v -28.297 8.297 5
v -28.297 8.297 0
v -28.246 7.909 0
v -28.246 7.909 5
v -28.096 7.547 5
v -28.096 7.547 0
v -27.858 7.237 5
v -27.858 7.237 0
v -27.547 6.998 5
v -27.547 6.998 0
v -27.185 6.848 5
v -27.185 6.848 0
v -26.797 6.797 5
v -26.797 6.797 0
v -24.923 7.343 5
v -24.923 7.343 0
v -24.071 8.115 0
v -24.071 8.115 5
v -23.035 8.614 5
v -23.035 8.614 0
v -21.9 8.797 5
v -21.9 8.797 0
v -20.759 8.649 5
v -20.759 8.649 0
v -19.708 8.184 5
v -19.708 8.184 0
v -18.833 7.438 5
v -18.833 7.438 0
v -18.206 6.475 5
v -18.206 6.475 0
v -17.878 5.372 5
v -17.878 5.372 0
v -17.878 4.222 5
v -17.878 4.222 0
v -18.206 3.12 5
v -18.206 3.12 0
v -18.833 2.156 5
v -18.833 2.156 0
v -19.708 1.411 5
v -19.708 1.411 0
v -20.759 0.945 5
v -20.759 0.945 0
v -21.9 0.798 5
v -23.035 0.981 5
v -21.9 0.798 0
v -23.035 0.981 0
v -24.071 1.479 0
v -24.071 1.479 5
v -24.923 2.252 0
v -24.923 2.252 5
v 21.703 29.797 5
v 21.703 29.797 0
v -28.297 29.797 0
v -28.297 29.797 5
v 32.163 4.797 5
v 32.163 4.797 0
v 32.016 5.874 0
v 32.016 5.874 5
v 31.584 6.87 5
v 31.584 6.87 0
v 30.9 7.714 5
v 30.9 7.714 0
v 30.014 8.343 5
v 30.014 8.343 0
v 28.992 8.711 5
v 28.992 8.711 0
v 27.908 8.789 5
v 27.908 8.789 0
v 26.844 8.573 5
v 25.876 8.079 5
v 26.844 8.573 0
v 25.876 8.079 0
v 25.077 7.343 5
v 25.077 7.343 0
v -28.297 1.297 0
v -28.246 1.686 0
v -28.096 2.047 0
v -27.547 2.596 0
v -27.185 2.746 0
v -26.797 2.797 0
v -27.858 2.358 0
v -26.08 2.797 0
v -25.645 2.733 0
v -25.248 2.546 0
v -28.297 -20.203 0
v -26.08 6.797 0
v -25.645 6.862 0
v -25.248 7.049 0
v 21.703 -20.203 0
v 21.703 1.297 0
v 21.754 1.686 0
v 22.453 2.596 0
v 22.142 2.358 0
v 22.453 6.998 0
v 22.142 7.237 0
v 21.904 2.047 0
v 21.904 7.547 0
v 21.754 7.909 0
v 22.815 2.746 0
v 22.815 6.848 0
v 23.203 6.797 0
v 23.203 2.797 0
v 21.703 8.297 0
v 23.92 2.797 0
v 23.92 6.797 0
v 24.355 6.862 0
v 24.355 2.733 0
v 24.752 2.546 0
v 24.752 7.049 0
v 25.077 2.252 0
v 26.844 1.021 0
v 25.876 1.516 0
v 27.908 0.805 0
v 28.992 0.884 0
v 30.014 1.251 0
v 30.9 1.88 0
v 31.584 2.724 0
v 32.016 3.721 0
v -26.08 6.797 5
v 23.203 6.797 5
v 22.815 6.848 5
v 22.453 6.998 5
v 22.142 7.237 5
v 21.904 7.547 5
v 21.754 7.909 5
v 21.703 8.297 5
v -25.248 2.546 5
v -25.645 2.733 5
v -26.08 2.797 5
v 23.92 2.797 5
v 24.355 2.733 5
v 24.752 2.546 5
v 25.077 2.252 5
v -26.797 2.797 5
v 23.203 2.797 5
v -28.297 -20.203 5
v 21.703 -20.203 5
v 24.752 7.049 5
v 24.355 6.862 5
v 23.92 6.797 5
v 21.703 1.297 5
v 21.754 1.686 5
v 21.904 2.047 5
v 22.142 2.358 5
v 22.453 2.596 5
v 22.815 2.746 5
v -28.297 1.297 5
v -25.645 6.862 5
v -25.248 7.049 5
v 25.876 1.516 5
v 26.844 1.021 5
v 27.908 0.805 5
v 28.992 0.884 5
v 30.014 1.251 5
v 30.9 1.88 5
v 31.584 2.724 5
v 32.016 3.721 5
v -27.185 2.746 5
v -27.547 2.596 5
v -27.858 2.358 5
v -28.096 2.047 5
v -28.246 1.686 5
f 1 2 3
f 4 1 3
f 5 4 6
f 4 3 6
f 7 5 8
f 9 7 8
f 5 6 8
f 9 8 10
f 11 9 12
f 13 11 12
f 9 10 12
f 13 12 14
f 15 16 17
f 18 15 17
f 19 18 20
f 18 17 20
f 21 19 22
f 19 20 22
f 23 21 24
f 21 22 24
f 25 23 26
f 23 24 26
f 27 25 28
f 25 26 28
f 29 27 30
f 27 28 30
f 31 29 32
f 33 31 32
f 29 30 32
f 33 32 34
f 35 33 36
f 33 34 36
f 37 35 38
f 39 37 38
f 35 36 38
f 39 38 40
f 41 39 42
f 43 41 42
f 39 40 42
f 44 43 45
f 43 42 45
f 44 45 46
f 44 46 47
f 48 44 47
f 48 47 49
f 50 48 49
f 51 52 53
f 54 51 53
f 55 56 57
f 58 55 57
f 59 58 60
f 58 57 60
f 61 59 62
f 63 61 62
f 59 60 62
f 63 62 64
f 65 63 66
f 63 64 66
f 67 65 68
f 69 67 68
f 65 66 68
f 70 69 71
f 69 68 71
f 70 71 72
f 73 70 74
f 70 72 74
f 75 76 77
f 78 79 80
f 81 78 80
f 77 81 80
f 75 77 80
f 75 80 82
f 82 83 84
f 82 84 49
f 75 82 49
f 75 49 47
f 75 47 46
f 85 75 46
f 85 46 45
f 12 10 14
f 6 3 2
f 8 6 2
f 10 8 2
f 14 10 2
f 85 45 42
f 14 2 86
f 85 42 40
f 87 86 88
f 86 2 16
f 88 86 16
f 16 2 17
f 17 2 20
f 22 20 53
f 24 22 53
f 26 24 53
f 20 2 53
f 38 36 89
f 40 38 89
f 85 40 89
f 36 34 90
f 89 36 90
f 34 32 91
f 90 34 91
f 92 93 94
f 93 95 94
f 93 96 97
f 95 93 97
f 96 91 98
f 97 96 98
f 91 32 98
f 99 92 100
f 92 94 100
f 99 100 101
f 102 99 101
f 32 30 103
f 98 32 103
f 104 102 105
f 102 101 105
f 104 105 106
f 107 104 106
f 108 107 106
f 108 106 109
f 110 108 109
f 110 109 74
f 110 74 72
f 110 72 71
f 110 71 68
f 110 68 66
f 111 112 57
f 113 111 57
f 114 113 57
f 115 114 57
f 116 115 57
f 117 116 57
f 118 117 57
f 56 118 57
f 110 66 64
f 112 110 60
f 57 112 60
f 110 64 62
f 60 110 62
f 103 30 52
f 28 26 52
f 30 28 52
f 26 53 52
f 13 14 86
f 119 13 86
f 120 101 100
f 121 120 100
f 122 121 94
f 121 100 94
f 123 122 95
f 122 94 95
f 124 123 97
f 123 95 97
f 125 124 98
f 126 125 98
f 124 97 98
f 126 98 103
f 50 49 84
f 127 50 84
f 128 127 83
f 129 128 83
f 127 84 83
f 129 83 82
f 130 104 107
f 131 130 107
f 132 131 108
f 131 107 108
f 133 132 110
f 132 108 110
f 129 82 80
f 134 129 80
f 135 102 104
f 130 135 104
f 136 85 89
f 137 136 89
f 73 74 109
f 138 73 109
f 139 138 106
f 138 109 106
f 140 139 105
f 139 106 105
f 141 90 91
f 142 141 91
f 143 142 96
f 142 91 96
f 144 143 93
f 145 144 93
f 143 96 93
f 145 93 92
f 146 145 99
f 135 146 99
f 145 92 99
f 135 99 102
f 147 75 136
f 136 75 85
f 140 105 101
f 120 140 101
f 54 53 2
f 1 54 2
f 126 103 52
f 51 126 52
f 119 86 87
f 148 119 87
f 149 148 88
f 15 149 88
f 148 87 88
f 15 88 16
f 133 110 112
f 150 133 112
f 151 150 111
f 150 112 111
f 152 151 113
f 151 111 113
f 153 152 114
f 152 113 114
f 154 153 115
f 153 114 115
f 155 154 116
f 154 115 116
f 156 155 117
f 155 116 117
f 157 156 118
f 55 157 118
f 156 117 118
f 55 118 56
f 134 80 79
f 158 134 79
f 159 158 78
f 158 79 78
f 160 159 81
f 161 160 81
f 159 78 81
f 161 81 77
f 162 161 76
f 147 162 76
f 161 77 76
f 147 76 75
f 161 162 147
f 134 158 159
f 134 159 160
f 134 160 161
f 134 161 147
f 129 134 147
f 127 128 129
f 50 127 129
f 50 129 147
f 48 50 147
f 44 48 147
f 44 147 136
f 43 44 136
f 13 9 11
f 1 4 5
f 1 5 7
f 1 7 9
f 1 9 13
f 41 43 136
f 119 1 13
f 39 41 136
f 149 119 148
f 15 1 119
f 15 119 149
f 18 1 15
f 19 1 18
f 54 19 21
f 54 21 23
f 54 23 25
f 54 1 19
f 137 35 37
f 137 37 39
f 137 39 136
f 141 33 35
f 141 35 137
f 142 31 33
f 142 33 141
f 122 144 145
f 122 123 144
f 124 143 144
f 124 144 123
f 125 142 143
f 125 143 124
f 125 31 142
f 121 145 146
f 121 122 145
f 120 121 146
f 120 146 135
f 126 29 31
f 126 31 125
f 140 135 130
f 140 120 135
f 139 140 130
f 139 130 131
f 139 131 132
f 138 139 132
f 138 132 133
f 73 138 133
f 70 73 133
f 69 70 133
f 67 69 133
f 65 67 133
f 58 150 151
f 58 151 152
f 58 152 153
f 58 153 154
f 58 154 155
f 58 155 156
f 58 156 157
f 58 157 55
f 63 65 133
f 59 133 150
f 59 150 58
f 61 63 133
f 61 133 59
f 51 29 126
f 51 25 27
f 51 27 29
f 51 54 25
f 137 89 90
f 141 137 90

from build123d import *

# Parameters (mm, degrees)
F1_DEPTH = 5


with BuildPart() as f1:
    # F0 (on Top) → F1 (new body)
    with BuildSketch(Plane.XY):
        with BuildLine():
            Line((21.70305, 29.797339), (-28.29695, 29.797339))
            Line((-28.29695, 29.797339), (-28.29695, 8.297339))
            ThreePointArc((-28.29695, 8.297339), (-27.85761, 7.236679), (-26.79695, 6.797339))
            Line((-26.79695, 6.797339), (-26.079591, 6.797339))
            ThreePointArc((-26.079591, 6.797339), (-25.439988, 6.940538), (-24.922507, 7.342794))
            ThreePointArc((-24.922507, 7.342794), (-17.83695, 4.797339), (-24.922507, 2.251885))
            ThreePointArc((-24.922507, 2.251885), (-25.439988, 2.65414), (-26.079591, 2.797339))
            Line((-26.079591, 2.797339), (-26.79695, 2.797339))
            ThreePointArc((-26.79695, 2.797339), (-27.85761, 2.358), (-28.29695, 1.297339))
            Line((-28.29695, 1.297339), (-28.29695, -20.202661))
            Line((-28.29695, -20.202661), (21.70305, -20.202661))
            Line((21.70305, -20.202661), (21.70305, 1.297339))
            ThreePointArc((21.70305, 1.297339), (22.14239, 2.358), (23.20305, 2.797339))
            Line((23.20305, 2.797339), (23.920409, 2.797339))
            ThreePointArc((23.920409, 2.797339), (24.560012, 2.65414), (25.077493, 2.251885))
            ThreePointArc((25.077493, 2.251885), (29.515413, 1.032885), (32.16305, 4.797339))
            ThreePointArc((32.16305, 4.797339), (29.515413, 8.561793), (25.077493, 7.342794))
            ThreePointArc((25.077493, 7.342794), (24.560012, 6.940538), (23.920409, 6.797339))
            Line((23.920409, 6.797339), (23.20305, 6.797339))
            ThreePointArc((23.20305, 6.797339), (22.14239, 7.236679), (21.70305, 8.297339))
            Line((21.70305, 8.297339), (21.70305, 29.797339))
        make_face()
    extrude(amount=F1_DEPTH)


solid = f1.part
